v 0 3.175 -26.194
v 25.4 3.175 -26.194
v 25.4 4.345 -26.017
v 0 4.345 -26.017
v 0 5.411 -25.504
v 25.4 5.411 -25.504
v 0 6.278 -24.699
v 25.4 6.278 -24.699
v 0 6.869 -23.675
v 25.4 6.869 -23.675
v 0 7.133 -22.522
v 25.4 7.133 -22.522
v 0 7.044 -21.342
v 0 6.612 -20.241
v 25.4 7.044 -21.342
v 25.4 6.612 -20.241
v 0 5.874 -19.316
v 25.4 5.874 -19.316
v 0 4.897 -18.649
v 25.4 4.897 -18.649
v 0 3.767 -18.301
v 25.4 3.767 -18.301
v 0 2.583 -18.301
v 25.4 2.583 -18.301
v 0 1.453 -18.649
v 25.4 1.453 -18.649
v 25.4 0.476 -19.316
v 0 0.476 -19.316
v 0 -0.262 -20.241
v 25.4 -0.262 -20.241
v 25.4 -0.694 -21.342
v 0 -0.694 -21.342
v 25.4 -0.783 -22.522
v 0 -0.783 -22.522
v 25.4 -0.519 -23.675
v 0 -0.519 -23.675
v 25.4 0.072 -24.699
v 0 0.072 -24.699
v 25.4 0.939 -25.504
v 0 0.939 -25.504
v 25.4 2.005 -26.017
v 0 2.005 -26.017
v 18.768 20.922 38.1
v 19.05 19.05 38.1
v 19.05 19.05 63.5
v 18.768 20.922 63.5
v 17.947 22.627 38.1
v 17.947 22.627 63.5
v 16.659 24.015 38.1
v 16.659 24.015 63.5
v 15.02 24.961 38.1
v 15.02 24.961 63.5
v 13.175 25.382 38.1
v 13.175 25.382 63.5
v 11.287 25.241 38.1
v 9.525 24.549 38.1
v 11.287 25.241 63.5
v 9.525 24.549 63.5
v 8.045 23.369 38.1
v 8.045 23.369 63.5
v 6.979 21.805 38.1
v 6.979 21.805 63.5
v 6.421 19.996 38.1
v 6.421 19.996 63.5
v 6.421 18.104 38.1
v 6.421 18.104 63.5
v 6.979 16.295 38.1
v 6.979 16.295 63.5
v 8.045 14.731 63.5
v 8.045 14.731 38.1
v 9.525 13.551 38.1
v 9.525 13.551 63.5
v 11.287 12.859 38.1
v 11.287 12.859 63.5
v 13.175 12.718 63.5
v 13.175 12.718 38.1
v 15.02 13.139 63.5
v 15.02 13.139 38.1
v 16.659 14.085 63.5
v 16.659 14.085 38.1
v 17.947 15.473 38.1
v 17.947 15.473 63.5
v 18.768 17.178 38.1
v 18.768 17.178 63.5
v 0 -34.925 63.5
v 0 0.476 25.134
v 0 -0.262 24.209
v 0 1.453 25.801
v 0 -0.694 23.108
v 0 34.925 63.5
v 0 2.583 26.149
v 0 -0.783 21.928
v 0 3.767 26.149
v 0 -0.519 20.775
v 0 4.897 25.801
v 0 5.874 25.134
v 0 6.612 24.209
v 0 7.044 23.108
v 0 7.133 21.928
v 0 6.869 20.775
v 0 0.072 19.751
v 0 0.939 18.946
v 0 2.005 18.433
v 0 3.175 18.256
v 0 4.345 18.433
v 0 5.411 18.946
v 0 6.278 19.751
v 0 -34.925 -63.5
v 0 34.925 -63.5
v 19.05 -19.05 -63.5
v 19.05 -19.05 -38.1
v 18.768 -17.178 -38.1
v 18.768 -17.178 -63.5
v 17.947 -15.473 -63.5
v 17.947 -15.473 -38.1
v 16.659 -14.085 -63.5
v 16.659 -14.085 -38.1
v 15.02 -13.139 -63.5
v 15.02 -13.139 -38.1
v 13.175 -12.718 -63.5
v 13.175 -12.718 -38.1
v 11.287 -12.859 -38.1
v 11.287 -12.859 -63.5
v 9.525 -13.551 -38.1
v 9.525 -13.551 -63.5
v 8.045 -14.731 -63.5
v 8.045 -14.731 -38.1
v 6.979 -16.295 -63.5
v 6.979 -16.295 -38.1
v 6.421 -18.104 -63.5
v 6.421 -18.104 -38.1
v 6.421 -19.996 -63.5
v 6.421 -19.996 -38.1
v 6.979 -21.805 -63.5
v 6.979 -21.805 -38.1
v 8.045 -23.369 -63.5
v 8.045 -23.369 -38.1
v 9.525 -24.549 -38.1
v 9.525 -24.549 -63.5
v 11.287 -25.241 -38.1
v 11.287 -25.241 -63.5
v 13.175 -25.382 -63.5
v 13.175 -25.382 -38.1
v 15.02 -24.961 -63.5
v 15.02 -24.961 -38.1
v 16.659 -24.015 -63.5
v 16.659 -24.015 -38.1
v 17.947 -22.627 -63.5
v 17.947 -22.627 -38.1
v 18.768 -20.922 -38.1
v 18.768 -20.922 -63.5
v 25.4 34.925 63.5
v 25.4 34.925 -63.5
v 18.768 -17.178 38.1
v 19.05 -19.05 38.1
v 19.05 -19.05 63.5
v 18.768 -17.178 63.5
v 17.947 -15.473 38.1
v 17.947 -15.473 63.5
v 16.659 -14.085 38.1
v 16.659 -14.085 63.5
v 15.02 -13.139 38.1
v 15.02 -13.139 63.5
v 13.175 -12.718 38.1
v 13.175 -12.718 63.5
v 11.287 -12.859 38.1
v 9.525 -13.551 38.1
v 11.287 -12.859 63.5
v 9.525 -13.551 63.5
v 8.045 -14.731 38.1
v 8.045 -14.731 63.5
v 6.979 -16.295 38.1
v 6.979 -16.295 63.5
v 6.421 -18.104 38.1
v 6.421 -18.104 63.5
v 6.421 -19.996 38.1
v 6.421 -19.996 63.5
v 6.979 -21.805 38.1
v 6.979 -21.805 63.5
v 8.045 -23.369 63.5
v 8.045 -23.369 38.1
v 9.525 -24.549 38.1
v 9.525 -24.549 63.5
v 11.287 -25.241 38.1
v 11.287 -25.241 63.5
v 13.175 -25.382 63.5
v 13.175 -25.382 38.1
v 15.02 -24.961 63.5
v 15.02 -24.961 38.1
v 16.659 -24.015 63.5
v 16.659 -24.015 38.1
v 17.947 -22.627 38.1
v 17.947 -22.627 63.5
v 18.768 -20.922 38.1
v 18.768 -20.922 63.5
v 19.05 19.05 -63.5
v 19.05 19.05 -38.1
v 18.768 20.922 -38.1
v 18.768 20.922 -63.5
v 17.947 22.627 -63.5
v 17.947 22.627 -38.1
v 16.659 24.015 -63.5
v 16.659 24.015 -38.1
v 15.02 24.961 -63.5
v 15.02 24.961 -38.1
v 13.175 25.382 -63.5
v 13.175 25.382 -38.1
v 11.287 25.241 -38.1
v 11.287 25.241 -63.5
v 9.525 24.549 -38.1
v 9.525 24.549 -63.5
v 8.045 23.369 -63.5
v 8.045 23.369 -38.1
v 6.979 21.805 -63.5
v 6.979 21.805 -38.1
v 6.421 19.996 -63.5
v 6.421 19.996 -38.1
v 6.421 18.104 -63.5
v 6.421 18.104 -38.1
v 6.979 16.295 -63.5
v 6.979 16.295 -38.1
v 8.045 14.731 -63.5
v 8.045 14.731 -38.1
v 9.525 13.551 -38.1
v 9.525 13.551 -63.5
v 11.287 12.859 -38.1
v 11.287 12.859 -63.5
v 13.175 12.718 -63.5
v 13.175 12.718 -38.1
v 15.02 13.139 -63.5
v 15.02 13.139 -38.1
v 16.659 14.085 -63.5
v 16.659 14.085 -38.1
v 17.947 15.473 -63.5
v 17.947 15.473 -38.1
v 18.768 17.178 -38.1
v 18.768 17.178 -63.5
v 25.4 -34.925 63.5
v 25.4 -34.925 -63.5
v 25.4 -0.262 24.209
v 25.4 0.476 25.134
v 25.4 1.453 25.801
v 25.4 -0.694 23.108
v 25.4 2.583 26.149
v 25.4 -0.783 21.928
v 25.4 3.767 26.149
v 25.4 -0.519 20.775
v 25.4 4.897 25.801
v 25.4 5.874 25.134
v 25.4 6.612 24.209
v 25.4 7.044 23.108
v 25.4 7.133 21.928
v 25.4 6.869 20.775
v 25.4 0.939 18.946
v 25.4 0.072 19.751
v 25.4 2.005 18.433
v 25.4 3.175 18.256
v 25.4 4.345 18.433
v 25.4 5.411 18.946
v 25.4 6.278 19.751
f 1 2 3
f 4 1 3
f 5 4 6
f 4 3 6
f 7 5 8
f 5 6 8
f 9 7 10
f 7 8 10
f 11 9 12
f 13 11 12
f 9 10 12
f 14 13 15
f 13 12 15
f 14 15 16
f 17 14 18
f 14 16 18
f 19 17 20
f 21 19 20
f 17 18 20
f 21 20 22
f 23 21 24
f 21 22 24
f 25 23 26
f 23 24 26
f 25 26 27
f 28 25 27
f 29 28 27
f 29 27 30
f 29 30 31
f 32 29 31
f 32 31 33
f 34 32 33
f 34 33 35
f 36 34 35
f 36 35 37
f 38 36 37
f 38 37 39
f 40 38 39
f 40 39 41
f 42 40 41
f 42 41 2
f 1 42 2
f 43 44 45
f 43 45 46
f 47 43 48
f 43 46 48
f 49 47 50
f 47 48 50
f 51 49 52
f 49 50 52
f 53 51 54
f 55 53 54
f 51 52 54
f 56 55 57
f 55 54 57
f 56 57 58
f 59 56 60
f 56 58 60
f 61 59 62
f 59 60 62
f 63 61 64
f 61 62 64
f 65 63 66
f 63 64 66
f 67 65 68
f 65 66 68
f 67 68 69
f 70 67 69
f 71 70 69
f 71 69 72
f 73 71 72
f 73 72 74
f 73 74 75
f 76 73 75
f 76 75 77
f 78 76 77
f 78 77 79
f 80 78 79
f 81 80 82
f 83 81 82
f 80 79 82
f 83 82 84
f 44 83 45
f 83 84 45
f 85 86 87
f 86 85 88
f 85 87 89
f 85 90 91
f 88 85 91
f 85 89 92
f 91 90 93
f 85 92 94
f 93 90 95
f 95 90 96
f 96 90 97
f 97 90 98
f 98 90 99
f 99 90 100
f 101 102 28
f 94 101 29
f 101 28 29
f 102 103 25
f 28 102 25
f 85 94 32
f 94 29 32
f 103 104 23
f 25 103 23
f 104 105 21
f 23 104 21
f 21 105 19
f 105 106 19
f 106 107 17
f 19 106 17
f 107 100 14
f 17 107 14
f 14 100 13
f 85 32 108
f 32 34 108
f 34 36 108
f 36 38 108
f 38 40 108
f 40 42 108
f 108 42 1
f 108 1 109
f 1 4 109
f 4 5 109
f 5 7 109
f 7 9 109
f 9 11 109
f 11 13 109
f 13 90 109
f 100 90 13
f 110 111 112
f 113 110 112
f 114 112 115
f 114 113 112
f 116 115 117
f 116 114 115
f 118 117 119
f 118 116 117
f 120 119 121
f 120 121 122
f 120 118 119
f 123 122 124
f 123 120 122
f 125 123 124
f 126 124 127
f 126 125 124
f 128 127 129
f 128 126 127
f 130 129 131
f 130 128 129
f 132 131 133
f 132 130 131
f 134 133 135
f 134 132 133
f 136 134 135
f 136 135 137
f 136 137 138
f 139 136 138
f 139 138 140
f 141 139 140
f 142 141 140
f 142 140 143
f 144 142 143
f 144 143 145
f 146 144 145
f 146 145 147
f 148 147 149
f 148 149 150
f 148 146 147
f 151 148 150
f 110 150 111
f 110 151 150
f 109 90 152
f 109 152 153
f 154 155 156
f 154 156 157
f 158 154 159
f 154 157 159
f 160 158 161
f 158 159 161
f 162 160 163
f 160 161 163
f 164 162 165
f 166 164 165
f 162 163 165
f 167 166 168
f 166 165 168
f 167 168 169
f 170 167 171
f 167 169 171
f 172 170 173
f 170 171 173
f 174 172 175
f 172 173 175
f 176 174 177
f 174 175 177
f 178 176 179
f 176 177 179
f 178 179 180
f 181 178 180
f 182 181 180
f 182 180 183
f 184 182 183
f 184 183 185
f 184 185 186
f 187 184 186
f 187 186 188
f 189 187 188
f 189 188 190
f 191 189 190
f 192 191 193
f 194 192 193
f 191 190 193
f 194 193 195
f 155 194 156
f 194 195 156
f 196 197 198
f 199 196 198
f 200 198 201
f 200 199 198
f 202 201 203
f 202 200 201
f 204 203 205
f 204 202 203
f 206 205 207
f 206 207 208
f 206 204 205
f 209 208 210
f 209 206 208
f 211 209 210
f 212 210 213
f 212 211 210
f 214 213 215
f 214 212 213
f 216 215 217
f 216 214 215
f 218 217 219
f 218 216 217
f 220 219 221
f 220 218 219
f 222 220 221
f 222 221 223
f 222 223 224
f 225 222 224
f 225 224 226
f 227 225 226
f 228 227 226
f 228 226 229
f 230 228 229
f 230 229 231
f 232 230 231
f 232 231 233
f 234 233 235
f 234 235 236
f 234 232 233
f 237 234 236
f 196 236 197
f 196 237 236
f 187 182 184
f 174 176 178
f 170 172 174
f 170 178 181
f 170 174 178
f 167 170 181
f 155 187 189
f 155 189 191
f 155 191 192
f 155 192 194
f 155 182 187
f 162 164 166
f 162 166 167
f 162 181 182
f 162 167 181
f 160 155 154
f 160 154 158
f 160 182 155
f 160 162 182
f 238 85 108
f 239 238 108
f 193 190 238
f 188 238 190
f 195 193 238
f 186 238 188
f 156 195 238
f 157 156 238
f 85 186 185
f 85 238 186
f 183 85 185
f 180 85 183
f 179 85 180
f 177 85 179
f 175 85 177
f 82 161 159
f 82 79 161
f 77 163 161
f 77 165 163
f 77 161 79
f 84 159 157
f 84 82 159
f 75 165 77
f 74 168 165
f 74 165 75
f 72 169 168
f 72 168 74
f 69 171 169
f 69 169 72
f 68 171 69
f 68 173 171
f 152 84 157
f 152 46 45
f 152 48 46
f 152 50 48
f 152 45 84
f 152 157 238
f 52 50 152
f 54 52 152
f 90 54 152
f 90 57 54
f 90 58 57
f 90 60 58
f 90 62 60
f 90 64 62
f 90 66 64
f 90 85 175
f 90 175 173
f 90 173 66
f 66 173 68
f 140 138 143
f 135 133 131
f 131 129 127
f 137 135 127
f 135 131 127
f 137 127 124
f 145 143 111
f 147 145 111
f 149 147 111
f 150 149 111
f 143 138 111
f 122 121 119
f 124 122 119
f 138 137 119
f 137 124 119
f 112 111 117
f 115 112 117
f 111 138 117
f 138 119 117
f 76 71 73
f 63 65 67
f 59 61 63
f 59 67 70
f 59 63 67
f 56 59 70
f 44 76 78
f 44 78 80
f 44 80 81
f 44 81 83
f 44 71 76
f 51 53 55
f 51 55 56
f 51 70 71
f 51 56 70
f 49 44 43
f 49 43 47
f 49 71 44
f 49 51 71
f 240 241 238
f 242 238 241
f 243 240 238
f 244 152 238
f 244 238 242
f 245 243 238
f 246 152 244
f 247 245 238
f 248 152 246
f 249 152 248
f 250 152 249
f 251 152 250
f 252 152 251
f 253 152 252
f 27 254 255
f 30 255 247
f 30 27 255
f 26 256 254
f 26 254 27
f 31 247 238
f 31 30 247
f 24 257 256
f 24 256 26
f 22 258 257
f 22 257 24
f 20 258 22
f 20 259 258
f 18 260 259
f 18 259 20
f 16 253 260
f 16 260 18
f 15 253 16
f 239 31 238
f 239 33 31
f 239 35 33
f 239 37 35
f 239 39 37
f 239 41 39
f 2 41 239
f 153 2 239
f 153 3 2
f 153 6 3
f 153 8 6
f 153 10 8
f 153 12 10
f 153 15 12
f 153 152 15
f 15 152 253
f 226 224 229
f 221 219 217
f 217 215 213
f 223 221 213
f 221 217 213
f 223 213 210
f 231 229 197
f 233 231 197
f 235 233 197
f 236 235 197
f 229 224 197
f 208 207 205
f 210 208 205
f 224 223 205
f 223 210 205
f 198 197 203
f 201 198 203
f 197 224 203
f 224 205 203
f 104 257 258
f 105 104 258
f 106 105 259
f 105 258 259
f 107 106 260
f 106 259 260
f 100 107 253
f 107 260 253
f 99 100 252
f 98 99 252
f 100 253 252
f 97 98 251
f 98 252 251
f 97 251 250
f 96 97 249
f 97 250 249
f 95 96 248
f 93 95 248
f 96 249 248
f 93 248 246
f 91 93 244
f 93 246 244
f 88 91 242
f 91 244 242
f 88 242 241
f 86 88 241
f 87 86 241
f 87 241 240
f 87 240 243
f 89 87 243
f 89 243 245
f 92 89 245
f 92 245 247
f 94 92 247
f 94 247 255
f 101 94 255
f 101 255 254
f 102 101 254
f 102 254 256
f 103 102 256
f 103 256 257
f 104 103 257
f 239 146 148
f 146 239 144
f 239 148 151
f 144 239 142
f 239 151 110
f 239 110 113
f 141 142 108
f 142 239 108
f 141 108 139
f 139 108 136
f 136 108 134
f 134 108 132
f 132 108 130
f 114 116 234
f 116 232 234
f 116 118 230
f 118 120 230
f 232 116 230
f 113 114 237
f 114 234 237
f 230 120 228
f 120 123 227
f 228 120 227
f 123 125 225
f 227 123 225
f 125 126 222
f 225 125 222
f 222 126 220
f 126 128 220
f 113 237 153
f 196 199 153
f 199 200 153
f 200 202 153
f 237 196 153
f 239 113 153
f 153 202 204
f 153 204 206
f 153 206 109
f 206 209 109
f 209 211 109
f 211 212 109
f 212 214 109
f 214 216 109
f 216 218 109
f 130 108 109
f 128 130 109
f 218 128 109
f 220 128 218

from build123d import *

# Parameters (mm, degrees)
SKETCH1_W           = 127
SKETCH1_H           = 69.85
BOSS_EXTRUDE1_DEPTH = 25.4
SKETCH2_R           = 6.35
CUT_EXTRUDE1_DEPTH  = 25.4
SKETCH3_R           = 3.96875
CUT_EXTRUDE2_DEPTH  = 26.4


with BuildPart() as part:
    # Sketch1 → Boss-Extrude1 (new body)
    with BuildSketch(Plane(origin=(0, 0, 0), x_dir=(0, 0, -1), z_dir=(1, 0, 0))):
        Rectangle(SKETCH1_W, SKETCH1_H)
    extrude(amount=BOSS_EXTRUDE1_DEPTH)

    # Sketch2 → Cut-Extrude1 (cut)
    with BuildSketch(Plane.XY.offset(63.5)):
        with Locations((12.7, 19.05)):
            Circle(SKETCH2_R)
        with Locations((12.7, -19.05)):
            Circle(SKETCH2_R)
    cut_extrude1 = extrude(amount=-CUT_EXTRUDE1_DEPTH, mode=Mode.SUBTRACT)

    # Mirror1: Cut-Extrude1 across plane
    add(cut_extrude1.mirror(Plane.XY), mode=Mode.SUBTRACT)

    # Sketch3 → Cut-Extrude2 (cut, through all)
    with BuildSketch(Plane(origin=(25.4, 0, 0), x_dir=(0, 0, -1), z_dir=(1, 0, 0))):
        with Locations((-22.225, 3.175)):
            Circle(SKETCH3_R)
        with Locations((22.225, 3.175)):
            Circle(SKETCH3_R)
    extrude(amount=-CUT_EXTRUDE2_DEPTH, mode=Mode.SUBTRACT)


solid = part.part
